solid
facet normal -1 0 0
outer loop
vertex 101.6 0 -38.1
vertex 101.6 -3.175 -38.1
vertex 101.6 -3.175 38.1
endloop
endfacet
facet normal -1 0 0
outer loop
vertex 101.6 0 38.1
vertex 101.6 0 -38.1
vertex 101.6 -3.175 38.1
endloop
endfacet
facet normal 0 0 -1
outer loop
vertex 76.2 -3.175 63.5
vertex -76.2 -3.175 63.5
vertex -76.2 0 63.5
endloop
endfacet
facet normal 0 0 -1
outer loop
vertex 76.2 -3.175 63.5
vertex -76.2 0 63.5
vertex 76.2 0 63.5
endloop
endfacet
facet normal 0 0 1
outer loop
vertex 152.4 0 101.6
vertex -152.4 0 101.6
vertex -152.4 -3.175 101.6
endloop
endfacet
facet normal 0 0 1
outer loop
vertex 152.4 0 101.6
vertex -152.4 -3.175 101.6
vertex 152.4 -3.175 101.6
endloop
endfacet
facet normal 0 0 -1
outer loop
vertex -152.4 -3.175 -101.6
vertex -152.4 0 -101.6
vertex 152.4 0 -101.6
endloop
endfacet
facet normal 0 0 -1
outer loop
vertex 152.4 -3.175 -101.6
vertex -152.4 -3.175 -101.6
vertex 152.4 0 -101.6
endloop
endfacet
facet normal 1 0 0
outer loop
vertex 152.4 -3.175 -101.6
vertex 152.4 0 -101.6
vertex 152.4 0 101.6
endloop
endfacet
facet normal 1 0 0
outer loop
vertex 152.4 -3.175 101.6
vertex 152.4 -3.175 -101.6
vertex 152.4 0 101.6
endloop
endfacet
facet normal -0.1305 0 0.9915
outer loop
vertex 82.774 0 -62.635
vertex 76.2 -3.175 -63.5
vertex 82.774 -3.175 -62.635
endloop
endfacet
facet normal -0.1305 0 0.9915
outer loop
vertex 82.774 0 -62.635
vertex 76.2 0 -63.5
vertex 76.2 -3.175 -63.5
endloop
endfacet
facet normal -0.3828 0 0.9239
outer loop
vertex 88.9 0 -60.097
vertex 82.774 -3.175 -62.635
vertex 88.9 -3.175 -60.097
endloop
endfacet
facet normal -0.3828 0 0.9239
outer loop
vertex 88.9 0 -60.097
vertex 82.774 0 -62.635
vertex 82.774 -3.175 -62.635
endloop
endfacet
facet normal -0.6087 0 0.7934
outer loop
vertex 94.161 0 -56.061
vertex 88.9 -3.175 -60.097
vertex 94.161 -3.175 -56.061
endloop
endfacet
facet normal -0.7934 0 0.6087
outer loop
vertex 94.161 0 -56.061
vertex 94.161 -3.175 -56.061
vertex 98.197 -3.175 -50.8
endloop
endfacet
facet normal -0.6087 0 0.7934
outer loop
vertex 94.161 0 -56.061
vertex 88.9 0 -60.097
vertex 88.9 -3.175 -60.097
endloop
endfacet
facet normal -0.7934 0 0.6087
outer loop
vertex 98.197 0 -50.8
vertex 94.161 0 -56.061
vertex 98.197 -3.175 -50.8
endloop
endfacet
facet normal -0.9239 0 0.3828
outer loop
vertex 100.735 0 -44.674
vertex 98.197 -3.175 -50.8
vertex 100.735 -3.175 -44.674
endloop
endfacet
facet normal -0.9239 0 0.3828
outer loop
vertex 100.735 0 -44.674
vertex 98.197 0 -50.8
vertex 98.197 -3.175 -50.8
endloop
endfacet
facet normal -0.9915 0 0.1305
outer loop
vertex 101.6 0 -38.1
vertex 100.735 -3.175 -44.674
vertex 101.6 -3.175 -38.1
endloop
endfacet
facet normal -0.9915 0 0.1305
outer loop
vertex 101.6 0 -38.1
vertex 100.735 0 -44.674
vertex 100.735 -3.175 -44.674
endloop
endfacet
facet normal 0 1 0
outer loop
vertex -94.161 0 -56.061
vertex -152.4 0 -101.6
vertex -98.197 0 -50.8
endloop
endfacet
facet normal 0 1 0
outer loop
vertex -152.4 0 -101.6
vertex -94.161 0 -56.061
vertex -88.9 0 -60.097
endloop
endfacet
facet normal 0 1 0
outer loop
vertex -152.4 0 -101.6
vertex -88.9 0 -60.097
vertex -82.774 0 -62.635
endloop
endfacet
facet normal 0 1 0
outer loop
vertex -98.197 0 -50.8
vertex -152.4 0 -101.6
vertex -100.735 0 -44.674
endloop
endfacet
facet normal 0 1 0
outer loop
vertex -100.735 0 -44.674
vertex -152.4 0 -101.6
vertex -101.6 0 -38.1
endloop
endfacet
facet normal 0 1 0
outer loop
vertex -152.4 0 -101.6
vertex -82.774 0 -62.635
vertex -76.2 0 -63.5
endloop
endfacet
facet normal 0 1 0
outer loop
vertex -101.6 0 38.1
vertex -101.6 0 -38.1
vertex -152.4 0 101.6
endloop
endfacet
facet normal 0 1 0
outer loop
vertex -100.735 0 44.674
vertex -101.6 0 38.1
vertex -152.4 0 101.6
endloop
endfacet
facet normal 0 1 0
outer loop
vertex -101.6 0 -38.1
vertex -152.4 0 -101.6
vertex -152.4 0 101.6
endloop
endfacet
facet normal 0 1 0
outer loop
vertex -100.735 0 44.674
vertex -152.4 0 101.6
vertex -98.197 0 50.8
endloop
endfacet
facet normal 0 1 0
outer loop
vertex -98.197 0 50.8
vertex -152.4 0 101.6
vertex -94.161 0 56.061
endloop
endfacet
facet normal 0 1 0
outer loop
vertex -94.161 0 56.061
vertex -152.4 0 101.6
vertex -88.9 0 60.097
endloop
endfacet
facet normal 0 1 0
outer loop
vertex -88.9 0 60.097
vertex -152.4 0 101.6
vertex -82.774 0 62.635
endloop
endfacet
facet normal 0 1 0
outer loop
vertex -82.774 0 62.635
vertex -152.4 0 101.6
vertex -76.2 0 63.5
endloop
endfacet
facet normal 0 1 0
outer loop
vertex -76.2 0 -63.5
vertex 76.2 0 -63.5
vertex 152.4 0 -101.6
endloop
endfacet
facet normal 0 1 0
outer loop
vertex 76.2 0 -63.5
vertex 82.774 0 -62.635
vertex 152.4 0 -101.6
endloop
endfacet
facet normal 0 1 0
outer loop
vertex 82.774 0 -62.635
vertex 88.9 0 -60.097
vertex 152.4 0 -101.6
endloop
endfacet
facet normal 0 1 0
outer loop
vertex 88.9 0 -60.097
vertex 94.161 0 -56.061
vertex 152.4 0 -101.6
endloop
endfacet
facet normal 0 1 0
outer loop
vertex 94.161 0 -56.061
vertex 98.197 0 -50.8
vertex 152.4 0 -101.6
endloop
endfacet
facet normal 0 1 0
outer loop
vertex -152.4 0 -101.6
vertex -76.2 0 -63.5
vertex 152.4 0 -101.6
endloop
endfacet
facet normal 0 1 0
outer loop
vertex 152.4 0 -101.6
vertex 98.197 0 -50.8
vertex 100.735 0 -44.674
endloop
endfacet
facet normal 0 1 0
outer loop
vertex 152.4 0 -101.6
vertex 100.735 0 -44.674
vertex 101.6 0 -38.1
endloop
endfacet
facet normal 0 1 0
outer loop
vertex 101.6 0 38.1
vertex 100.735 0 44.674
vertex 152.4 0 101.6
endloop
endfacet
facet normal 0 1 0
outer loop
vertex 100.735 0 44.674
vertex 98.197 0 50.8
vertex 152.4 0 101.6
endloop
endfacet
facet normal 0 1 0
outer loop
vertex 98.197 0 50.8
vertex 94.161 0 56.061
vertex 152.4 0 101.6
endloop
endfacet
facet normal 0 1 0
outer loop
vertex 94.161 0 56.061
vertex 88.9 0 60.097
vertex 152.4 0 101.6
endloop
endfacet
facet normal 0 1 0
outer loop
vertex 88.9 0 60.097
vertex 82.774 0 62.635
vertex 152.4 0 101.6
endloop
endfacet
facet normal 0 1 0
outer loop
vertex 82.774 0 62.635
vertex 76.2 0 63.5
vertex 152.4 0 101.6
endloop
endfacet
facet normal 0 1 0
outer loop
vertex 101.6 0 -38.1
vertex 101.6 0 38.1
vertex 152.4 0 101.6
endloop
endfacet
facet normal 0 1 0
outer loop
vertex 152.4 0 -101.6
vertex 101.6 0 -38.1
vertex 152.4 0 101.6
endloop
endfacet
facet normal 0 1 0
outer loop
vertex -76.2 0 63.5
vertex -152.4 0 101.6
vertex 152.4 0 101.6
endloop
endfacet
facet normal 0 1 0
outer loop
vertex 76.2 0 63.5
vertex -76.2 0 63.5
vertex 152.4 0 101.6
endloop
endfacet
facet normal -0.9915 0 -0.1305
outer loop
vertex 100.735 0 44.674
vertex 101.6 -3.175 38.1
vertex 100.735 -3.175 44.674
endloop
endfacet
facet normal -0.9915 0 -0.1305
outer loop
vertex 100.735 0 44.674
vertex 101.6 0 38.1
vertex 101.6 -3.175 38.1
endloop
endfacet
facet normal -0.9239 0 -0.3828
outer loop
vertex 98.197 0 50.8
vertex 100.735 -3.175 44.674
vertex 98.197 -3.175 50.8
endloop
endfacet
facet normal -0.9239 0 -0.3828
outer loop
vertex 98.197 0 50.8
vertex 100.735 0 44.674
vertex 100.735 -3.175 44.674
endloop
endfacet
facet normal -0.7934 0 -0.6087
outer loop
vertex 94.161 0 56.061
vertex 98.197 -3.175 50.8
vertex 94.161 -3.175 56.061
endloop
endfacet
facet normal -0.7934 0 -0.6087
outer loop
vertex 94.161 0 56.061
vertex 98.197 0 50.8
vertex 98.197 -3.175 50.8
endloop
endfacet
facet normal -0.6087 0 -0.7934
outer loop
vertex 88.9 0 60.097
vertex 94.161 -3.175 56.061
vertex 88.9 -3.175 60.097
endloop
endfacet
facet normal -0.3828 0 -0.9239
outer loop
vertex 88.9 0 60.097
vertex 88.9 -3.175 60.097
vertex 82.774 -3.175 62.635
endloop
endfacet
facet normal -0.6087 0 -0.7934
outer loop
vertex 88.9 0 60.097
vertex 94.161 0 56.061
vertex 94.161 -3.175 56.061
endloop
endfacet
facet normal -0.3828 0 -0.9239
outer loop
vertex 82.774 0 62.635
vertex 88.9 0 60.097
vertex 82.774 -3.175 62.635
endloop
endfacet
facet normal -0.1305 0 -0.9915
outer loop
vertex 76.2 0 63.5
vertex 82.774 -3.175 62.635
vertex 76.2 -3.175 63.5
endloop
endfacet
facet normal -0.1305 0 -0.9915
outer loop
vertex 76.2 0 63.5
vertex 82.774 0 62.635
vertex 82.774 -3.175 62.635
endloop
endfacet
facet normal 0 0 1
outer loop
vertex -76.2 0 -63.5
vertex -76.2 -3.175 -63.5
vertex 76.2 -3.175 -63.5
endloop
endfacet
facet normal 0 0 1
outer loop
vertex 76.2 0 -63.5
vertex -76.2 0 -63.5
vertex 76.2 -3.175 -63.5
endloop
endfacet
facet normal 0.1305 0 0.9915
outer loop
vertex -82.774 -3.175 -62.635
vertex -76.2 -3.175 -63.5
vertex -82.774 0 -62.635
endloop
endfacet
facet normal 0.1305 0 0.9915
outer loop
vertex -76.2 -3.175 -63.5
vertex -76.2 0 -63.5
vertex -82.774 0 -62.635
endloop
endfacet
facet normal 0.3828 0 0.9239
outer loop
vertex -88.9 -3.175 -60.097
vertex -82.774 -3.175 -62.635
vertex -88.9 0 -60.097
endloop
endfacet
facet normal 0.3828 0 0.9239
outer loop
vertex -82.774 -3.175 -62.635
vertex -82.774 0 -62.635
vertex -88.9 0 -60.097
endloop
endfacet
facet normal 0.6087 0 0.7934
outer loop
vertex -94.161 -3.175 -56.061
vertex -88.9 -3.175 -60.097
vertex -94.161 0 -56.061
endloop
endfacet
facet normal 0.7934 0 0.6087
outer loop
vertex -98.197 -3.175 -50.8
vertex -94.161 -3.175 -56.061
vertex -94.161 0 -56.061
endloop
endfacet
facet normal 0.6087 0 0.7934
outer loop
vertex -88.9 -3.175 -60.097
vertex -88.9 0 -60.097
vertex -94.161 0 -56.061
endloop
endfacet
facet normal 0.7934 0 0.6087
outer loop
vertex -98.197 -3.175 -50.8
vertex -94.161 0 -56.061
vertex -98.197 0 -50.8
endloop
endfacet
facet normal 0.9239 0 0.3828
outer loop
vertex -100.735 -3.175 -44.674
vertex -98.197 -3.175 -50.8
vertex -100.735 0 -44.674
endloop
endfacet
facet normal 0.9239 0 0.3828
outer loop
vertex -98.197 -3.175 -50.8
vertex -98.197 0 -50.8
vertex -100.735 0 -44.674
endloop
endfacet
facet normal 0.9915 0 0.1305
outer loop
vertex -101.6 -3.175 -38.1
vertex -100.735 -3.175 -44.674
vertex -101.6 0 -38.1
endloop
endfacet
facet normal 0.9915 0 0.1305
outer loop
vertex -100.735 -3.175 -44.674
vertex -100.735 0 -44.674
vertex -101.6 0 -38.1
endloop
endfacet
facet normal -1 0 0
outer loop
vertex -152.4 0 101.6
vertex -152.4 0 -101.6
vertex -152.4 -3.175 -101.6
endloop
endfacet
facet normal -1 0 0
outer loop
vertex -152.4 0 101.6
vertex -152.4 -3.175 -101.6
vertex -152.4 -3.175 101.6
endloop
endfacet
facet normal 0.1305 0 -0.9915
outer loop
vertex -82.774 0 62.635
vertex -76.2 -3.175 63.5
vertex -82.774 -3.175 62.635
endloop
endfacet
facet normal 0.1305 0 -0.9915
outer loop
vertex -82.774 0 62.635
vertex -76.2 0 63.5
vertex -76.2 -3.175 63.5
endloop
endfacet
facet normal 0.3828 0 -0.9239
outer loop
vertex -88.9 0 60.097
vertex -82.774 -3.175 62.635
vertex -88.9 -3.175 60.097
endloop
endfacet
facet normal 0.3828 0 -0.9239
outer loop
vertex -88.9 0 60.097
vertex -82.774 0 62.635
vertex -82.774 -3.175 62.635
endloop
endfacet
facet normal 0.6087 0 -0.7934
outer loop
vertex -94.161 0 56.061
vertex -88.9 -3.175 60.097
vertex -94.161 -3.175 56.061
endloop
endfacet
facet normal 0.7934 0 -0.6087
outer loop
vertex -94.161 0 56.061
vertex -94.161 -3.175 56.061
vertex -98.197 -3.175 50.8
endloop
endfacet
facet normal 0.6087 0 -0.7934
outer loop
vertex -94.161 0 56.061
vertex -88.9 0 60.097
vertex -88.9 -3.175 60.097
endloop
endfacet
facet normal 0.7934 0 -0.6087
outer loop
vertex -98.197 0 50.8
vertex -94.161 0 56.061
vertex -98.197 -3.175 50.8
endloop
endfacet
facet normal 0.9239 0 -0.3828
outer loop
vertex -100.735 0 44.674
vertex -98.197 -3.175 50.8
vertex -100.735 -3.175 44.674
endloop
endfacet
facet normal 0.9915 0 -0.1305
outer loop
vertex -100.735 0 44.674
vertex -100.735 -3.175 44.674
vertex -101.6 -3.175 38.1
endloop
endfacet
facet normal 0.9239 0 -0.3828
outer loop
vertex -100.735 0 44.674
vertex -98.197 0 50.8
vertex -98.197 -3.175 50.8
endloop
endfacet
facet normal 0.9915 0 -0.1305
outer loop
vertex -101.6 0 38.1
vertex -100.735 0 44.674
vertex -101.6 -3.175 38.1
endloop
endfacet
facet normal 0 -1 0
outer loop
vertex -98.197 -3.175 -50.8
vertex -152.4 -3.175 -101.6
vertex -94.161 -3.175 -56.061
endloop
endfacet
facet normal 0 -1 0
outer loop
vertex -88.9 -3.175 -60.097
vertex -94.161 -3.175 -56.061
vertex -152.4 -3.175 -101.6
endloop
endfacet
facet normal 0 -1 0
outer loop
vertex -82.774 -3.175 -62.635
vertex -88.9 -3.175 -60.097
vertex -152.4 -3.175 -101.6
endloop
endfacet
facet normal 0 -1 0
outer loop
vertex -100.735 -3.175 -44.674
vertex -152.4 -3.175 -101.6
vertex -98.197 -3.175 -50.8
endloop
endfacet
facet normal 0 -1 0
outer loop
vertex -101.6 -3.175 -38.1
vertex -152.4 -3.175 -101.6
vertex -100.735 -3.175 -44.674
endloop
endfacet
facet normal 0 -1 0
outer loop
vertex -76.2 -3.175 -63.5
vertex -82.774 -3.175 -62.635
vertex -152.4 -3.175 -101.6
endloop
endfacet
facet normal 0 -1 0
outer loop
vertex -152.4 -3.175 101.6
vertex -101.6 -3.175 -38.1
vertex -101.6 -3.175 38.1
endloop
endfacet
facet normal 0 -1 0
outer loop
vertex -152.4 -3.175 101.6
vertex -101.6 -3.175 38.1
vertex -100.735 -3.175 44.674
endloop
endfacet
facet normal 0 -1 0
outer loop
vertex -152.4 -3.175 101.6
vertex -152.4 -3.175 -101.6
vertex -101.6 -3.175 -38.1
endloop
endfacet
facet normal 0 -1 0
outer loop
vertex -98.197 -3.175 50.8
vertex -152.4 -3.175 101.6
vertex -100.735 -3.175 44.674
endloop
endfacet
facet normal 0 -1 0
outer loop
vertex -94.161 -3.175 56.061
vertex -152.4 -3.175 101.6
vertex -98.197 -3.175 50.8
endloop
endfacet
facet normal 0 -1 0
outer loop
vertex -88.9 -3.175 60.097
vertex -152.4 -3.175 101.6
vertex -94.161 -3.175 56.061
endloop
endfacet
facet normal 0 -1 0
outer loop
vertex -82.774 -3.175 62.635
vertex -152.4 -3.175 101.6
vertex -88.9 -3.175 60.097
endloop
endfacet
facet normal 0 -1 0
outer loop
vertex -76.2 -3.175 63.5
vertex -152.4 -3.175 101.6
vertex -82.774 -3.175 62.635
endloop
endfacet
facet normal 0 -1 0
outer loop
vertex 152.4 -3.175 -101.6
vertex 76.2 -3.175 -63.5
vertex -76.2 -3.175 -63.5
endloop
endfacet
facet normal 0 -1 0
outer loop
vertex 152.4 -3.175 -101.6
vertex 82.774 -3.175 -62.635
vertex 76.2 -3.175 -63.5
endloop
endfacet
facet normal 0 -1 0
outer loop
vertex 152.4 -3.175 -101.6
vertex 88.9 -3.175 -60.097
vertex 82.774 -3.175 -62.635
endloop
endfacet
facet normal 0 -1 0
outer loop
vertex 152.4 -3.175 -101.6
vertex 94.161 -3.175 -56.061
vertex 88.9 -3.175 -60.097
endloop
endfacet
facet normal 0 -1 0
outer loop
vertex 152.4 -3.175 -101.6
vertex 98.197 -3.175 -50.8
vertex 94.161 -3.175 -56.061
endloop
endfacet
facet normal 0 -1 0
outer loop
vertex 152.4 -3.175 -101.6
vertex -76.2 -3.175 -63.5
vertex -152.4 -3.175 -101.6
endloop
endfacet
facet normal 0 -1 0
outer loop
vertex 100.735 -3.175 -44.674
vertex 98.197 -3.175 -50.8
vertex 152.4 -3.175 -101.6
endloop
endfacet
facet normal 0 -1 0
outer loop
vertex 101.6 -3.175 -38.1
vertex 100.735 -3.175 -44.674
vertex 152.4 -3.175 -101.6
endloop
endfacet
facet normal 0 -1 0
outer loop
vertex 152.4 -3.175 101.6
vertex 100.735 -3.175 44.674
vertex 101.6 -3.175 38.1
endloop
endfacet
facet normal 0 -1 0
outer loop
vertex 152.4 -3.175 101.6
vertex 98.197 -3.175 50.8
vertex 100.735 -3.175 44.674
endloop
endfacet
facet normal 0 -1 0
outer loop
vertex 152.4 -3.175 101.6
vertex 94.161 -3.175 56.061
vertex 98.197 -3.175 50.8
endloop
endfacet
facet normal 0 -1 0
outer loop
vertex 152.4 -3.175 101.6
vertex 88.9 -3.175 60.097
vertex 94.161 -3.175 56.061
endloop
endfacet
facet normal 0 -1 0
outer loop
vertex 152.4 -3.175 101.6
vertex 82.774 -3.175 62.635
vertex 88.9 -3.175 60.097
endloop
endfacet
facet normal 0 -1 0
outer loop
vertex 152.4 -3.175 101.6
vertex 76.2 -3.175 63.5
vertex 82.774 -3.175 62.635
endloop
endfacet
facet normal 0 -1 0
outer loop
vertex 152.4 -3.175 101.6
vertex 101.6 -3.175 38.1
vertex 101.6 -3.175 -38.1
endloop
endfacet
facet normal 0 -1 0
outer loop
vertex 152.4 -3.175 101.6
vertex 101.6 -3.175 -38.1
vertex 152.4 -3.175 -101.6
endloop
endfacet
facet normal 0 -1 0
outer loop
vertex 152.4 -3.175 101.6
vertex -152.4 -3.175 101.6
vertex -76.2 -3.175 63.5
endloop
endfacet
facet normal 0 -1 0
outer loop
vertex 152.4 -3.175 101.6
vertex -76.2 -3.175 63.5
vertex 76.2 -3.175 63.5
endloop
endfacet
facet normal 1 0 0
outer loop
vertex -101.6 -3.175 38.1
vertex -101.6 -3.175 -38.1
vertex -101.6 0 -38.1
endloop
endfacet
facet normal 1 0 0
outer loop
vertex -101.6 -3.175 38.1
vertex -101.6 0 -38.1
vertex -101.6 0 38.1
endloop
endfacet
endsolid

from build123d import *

# Parameters (mm, degrees)
F0_W     = 304.8
F0_H     = 203.2
F1_DEPTH = 3.175
F2_W     = 203.2
F2_H     = 127
F3_DEPTH = 25.4
F4_R     = 25.4


with BuildPart() as f1:
    # F0 (on Front) → F1 (new body)
    with BuildSketch(Plane.XZ):
        Rectangle(F0_W, F0_H)
    extrude(amount=F1_DEPTH)

    # F2 (on face) → F3 (cut)
    with BuildSketch(Plane.XZ.offset(3.175)):
        Rectangle(F2_W, F2_H)
    extrude(amount=-F3_DEPTH, mode=Mode.SUBTRACT)

    # F4
    f4_edges = [f1.edges().sort_by_distance(p)[0] for p in [
        (-101.6, -1.5875, 63.5),
        (-101.6, -1.5875, -63.5),
        (101.6, -1.5875, -63.5),
        (101.6, -1.5875, 63.5),
    ]]
    fillet(f4_edges, radius=F4_R)


solid = f1.part
